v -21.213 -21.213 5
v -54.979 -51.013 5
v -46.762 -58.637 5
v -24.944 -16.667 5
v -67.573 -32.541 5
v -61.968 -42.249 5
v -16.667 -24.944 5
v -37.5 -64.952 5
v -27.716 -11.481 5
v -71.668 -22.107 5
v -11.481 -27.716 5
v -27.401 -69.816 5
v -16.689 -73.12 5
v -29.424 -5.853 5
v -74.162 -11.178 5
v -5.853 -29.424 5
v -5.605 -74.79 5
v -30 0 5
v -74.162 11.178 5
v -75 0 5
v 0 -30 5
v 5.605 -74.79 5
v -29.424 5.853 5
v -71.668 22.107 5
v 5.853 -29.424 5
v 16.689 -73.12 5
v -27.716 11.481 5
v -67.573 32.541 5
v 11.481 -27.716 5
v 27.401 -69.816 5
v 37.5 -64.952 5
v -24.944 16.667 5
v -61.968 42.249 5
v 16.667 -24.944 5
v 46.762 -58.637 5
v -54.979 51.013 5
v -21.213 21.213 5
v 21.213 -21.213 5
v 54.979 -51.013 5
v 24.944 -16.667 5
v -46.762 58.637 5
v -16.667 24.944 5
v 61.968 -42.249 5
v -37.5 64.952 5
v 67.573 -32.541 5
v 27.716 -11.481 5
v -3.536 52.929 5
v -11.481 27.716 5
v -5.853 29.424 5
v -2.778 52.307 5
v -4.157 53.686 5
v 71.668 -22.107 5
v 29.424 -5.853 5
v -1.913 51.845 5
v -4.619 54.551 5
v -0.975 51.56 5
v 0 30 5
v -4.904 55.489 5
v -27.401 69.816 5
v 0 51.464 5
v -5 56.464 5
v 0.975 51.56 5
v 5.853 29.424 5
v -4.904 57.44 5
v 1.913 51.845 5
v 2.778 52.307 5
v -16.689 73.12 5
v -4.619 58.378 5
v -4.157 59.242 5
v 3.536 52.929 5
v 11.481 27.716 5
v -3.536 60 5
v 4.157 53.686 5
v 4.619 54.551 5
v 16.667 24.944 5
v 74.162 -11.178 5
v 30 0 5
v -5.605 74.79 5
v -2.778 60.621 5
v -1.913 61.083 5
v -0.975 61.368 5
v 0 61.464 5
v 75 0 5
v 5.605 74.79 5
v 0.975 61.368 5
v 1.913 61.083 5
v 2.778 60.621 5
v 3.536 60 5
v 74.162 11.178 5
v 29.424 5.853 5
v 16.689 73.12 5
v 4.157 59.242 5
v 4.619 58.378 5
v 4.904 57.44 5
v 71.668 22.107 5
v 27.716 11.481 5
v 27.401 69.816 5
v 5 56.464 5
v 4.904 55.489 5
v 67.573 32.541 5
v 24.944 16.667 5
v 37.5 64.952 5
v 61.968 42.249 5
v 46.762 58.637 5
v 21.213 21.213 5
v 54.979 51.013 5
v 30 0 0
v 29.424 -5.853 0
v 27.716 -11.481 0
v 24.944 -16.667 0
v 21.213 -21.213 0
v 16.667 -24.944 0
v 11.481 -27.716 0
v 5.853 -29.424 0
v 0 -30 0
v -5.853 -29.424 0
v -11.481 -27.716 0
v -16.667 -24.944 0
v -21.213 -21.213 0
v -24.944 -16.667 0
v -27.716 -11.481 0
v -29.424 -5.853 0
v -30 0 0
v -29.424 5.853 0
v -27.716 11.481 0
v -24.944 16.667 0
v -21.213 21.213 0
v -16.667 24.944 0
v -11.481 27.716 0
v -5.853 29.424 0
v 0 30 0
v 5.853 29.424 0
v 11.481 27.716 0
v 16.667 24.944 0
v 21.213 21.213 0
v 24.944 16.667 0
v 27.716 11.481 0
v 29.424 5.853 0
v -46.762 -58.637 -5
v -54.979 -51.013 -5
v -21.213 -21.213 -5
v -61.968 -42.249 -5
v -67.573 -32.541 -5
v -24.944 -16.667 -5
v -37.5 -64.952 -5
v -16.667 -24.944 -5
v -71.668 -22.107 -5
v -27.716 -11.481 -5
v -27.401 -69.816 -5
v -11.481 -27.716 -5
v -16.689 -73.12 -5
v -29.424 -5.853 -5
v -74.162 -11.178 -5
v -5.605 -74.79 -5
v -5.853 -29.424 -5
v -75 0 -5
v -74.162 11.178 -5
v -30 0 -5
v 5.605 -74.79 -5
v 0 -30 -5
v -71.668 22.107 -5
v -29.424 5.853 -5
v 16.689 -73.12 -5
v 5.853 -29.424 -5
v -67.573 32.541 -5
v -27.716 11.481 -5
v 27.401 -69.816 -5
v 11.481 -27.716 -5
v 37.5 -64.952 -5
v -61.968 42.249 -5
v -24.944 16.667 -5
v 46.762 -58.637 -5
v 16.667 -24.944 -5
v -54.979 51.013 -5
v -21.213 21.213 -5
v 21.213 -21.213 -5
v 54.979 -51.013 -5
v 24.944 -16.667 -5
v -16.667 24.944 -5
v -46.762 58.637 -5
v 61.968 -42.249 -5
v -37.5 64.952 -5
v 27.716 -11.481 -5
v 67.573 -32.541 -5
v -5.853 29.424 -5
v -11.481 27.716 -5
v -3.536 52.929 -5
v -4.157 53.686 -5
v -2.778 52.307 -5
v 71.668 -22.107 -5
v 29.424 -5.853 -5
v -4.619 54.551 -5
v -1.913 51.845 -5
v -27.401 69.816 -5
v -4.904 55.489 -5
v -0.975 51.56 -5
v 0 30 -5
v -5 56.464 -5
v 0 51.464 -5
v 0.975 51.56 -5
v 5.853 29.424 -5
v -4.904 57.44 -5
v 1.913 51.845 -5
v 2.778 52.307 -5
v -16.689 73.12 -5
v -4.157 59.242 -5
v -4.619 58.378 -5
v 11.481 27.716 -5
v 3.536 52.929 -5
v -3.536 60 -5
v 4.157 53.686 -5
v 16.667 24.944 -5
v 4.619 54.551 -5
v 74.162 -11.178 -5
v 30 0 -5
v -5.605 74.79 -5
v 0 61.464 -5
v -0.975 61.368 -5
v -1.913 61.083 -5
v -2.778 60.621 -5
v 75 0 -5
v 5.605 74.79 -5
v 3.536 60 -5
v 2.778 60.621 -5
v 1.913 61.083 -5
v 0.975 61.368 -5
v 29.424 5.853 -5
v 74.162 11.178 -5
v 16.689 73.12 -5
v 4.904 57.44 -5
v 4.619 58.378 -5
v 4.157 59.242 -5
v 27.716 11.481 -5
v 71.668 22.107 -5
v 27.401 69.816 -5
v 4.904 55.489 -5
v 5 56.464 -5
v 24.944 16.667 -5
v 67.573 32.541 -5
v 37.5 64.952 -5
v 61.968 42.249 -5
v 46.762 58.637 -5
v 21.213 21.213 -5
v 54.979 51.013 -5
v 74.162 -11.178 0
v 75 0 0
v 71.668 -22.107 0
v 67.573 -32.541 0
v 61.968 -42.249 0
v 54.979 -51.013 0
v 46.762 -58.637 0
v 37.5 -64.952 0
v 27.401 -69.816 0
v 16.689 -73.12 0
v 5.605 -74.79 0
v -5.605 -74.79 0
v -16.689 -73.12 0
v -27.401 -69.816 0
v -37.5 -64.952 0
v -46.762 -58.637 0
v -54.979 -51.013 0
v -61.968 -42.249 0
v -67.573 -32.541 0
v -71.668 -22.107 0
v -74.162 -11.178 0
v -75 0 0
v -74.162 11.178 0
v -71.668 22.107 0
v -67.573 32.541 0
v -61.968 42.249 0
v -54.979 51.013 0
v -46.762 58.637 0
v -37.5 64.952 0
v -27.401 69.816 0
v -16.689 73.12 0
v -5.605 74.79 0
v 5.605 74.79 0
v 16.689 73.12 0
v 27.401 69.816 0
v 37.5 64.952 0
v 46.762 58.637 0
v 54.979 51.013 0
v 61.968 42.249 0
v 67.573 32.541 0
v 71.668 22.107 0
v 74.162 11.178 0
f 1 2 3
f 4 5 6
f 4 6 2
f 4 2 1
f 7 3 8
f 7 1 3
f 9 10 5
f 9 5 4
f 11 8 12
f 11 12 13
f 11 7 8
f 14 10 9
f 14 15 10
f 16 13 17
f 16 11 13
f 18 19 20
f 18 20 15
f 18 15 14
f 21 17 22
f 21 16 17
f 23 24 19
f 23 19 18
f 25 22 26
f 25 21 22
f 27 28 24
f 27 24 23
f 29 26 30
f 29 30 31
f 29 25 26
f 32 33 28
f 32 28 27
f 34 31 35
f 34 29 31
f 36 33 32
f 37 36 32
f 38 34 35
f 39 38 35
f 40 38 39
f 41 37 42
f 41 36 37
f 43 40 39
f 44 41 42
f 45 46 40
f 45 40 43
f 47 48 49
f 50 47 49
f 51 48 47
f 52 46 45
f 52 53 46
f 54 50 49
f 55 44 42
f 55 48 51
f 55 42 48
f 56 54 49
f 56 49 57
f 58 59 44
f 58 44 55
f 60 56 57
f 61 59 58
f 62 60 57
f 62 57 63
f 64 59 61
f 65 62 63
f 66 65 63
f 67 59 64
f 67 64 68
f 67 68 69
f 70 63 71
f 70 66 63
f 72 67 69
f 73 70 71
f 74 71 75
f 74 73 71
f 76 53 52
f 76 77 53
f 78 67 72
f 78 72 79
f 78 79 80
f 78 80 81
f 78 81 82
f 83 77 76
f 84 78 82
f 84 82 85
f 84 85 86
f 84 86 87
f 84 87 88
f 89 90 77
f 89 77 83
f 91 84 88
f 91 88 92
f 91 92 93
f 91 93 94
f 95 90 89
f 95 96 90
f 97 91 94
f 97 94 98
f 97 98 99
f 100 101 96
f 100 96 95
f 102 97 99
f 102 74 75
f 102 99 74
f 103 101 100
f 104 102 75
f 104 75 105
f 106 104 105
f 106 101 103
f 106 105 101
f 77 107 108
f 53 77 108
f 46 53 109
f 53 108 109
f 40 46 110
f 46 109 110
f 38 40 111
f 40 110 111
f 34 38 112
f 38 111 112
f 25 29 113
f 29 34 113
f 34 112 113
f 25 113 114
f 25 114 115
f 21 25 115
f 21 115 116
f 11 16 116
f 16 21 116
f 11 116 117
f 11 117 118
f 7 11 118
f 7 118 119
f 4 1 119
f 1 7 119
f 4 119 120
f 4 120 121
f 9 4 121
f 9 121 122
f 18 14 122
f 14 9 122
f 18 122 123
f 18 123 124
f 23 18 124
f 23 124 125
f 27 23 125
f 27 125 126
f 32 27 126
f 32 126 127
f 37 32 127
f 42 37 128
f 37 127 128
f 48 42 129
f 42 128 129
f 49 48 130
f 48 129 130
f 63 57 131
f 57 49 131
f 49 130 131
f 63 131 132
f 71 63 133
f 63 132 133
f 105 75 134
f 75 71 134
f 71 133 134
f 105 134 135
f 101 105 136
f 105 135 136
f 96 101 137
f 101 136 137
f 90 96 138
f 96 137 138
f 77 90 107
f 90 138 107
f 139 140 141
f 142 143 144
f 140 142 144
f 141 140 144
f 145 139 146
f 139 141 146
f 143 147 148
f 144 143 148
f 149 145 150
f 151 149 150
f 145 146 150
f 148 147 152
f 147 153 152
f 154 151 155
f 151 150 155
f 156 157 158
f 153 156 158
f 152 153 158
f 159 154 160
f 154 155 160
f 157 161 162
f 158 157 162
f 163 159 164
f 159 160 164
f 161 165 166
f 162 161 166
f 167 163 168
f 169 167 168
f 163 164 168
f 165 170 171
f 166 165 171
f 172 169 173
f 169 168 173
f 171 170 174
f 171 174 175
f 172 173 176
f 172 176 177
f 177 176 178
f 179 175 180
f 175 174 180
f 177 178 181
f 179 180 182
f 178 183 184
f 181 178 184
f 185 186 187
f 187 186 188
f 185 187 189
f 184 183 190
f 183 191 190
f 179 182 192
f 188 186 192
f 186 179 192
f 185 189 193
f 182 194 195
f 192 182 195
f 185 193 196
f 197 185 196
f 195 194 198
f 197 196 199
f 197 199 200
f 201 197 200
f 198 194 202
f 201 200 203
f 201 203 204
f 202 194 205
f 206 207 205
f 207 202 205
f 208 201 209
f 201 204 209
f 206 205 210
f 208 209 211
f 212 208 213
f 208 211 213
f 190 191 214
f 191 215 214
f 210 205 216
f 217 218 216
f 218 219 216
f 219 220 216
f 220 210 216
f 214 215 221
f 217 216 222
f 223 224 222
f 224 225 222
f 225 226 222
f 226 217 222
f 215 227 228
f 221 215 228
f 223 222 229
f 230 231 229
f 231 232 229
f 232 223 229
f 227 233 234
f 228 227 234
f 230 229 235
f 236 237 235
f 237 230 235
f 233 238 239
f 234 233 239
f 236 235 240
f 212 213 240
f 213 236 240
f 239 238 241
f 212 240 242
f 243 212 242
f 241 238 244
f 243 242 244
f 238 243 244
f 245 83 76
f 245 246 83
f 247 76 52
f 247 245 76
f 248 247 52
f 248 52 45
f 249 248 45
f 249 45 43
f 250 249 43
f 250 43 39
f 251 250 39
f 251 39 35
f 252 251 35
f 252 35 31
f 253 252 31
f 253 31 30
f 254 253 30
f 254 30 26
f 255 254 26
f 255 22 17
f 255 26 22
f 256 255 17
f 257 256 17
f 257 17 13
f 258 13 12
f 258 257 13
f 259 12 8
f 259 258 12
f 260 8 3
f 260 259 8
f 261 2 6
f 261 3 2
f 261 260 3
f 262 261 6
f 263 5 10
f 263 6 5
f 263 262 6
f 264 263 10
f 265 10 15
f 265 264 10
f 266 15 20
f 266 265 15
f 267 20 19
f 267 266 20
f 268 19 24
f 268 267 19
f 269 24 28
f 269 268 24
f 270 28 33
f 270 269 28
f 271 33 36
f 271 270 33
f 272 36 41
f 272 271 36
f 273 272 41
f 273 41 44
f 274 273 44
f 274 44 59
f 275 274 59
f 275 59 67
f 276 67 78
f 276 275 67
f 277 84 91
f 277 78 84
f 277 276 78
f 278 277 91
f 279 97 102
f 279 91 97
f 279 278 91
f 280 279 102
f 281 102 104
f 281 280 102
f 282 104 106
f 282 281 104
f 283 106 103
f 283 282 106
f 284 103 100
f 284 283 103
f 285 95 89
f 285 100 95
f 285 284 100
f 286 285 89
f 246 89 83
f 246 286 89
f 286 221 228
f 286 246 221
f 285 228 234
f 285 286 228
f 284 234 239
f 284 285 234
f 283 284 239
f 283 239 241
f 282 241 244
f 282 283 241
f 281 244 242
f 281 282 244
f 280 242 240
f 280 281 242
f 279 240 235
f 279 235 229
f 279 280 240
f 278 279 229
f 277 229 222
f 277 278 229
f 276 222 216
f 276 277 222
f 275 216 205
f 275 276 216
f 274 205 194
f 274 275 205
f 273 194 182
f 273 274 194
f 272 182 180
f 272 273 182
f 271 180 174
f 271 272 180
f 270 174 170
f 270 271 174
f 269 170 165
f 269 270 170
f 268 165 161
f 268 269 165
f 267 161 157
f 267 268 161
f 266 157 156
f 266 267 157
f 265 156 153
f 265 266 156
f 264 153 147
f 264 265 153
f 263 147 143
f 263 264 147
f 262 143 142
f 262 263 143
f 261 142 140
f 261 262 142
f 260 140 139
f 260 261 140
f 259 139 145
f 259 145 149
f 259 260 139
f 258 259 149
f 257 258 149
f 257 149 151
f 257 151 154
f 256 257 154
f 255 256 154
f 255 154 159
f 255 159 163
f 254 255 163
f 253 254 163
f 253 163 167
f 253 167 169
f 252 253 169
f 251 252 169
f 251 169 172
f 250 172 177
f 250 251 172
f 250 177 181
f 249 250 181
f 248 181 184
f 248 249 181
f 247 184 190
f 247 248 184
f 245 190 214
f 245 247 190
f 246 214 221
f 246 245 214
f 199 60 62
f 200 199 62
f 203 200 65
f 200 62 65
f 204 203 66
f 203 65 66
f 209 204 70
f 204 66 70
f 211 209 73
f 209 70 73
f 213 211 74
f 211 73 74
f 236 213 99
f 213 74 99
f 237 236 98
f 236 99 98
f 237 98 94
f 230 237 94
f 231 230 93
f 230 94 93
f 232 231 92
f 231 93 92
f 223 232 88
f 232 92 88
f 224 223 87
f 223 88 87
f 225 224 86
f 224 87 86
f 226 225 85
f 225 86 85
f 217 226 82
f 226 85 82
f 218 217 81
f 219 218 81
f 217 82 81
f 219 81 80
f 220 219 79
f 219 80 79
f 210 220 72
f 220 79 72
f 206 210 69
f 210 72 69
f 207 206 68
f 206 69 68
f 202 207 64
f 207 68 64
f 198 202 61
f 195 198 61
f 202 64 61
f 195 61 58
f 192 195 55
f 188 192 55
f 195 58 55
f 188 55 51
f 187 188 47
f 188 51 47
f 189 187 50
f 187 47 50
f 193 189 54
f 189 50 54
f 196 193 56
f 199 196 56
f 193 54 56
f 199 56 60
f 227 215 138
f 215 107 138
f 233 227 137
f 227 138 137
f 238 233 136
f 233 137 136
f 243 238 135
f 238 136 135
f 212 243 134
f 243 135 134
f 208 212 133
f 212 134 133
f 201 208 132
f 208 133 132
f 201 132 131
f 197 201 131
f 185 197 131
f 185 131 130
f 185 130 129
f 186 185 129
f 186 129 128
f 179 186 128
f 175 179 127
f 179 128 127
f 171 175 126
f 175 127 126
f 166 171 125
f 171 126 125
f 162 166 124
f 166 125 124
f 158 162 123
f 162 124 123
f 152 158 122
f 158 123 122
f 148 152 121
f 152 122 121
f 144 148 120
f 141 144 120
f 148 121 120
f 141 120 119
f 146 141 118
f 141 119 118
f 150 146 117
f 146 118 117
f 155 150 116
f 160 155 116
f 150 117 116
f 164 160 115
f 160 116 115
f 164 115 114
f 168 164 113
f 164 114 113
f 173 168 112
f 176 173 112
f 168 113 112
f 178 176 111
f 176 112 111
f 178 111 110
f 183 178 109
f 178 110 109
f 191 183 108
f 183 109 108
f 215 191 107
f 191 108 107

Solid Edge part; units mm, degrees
sketch "Sketch1" plane through (0, 0, 0) normal (0, 0, 1) x (1, 0, 0)
  circle A0 centre (0, 0) radius 75
  circle A1 centre (0, 0) radius 30
  dimension "D1" = 150
  dimension "D2" = 60
extrude "Protrusion1" add sketch "Sketch1" along normal mid plane 10
hole "Hole_1" at (0, 56.4641, 5) direction (0, 0, -1) diameter 10 end up to next
